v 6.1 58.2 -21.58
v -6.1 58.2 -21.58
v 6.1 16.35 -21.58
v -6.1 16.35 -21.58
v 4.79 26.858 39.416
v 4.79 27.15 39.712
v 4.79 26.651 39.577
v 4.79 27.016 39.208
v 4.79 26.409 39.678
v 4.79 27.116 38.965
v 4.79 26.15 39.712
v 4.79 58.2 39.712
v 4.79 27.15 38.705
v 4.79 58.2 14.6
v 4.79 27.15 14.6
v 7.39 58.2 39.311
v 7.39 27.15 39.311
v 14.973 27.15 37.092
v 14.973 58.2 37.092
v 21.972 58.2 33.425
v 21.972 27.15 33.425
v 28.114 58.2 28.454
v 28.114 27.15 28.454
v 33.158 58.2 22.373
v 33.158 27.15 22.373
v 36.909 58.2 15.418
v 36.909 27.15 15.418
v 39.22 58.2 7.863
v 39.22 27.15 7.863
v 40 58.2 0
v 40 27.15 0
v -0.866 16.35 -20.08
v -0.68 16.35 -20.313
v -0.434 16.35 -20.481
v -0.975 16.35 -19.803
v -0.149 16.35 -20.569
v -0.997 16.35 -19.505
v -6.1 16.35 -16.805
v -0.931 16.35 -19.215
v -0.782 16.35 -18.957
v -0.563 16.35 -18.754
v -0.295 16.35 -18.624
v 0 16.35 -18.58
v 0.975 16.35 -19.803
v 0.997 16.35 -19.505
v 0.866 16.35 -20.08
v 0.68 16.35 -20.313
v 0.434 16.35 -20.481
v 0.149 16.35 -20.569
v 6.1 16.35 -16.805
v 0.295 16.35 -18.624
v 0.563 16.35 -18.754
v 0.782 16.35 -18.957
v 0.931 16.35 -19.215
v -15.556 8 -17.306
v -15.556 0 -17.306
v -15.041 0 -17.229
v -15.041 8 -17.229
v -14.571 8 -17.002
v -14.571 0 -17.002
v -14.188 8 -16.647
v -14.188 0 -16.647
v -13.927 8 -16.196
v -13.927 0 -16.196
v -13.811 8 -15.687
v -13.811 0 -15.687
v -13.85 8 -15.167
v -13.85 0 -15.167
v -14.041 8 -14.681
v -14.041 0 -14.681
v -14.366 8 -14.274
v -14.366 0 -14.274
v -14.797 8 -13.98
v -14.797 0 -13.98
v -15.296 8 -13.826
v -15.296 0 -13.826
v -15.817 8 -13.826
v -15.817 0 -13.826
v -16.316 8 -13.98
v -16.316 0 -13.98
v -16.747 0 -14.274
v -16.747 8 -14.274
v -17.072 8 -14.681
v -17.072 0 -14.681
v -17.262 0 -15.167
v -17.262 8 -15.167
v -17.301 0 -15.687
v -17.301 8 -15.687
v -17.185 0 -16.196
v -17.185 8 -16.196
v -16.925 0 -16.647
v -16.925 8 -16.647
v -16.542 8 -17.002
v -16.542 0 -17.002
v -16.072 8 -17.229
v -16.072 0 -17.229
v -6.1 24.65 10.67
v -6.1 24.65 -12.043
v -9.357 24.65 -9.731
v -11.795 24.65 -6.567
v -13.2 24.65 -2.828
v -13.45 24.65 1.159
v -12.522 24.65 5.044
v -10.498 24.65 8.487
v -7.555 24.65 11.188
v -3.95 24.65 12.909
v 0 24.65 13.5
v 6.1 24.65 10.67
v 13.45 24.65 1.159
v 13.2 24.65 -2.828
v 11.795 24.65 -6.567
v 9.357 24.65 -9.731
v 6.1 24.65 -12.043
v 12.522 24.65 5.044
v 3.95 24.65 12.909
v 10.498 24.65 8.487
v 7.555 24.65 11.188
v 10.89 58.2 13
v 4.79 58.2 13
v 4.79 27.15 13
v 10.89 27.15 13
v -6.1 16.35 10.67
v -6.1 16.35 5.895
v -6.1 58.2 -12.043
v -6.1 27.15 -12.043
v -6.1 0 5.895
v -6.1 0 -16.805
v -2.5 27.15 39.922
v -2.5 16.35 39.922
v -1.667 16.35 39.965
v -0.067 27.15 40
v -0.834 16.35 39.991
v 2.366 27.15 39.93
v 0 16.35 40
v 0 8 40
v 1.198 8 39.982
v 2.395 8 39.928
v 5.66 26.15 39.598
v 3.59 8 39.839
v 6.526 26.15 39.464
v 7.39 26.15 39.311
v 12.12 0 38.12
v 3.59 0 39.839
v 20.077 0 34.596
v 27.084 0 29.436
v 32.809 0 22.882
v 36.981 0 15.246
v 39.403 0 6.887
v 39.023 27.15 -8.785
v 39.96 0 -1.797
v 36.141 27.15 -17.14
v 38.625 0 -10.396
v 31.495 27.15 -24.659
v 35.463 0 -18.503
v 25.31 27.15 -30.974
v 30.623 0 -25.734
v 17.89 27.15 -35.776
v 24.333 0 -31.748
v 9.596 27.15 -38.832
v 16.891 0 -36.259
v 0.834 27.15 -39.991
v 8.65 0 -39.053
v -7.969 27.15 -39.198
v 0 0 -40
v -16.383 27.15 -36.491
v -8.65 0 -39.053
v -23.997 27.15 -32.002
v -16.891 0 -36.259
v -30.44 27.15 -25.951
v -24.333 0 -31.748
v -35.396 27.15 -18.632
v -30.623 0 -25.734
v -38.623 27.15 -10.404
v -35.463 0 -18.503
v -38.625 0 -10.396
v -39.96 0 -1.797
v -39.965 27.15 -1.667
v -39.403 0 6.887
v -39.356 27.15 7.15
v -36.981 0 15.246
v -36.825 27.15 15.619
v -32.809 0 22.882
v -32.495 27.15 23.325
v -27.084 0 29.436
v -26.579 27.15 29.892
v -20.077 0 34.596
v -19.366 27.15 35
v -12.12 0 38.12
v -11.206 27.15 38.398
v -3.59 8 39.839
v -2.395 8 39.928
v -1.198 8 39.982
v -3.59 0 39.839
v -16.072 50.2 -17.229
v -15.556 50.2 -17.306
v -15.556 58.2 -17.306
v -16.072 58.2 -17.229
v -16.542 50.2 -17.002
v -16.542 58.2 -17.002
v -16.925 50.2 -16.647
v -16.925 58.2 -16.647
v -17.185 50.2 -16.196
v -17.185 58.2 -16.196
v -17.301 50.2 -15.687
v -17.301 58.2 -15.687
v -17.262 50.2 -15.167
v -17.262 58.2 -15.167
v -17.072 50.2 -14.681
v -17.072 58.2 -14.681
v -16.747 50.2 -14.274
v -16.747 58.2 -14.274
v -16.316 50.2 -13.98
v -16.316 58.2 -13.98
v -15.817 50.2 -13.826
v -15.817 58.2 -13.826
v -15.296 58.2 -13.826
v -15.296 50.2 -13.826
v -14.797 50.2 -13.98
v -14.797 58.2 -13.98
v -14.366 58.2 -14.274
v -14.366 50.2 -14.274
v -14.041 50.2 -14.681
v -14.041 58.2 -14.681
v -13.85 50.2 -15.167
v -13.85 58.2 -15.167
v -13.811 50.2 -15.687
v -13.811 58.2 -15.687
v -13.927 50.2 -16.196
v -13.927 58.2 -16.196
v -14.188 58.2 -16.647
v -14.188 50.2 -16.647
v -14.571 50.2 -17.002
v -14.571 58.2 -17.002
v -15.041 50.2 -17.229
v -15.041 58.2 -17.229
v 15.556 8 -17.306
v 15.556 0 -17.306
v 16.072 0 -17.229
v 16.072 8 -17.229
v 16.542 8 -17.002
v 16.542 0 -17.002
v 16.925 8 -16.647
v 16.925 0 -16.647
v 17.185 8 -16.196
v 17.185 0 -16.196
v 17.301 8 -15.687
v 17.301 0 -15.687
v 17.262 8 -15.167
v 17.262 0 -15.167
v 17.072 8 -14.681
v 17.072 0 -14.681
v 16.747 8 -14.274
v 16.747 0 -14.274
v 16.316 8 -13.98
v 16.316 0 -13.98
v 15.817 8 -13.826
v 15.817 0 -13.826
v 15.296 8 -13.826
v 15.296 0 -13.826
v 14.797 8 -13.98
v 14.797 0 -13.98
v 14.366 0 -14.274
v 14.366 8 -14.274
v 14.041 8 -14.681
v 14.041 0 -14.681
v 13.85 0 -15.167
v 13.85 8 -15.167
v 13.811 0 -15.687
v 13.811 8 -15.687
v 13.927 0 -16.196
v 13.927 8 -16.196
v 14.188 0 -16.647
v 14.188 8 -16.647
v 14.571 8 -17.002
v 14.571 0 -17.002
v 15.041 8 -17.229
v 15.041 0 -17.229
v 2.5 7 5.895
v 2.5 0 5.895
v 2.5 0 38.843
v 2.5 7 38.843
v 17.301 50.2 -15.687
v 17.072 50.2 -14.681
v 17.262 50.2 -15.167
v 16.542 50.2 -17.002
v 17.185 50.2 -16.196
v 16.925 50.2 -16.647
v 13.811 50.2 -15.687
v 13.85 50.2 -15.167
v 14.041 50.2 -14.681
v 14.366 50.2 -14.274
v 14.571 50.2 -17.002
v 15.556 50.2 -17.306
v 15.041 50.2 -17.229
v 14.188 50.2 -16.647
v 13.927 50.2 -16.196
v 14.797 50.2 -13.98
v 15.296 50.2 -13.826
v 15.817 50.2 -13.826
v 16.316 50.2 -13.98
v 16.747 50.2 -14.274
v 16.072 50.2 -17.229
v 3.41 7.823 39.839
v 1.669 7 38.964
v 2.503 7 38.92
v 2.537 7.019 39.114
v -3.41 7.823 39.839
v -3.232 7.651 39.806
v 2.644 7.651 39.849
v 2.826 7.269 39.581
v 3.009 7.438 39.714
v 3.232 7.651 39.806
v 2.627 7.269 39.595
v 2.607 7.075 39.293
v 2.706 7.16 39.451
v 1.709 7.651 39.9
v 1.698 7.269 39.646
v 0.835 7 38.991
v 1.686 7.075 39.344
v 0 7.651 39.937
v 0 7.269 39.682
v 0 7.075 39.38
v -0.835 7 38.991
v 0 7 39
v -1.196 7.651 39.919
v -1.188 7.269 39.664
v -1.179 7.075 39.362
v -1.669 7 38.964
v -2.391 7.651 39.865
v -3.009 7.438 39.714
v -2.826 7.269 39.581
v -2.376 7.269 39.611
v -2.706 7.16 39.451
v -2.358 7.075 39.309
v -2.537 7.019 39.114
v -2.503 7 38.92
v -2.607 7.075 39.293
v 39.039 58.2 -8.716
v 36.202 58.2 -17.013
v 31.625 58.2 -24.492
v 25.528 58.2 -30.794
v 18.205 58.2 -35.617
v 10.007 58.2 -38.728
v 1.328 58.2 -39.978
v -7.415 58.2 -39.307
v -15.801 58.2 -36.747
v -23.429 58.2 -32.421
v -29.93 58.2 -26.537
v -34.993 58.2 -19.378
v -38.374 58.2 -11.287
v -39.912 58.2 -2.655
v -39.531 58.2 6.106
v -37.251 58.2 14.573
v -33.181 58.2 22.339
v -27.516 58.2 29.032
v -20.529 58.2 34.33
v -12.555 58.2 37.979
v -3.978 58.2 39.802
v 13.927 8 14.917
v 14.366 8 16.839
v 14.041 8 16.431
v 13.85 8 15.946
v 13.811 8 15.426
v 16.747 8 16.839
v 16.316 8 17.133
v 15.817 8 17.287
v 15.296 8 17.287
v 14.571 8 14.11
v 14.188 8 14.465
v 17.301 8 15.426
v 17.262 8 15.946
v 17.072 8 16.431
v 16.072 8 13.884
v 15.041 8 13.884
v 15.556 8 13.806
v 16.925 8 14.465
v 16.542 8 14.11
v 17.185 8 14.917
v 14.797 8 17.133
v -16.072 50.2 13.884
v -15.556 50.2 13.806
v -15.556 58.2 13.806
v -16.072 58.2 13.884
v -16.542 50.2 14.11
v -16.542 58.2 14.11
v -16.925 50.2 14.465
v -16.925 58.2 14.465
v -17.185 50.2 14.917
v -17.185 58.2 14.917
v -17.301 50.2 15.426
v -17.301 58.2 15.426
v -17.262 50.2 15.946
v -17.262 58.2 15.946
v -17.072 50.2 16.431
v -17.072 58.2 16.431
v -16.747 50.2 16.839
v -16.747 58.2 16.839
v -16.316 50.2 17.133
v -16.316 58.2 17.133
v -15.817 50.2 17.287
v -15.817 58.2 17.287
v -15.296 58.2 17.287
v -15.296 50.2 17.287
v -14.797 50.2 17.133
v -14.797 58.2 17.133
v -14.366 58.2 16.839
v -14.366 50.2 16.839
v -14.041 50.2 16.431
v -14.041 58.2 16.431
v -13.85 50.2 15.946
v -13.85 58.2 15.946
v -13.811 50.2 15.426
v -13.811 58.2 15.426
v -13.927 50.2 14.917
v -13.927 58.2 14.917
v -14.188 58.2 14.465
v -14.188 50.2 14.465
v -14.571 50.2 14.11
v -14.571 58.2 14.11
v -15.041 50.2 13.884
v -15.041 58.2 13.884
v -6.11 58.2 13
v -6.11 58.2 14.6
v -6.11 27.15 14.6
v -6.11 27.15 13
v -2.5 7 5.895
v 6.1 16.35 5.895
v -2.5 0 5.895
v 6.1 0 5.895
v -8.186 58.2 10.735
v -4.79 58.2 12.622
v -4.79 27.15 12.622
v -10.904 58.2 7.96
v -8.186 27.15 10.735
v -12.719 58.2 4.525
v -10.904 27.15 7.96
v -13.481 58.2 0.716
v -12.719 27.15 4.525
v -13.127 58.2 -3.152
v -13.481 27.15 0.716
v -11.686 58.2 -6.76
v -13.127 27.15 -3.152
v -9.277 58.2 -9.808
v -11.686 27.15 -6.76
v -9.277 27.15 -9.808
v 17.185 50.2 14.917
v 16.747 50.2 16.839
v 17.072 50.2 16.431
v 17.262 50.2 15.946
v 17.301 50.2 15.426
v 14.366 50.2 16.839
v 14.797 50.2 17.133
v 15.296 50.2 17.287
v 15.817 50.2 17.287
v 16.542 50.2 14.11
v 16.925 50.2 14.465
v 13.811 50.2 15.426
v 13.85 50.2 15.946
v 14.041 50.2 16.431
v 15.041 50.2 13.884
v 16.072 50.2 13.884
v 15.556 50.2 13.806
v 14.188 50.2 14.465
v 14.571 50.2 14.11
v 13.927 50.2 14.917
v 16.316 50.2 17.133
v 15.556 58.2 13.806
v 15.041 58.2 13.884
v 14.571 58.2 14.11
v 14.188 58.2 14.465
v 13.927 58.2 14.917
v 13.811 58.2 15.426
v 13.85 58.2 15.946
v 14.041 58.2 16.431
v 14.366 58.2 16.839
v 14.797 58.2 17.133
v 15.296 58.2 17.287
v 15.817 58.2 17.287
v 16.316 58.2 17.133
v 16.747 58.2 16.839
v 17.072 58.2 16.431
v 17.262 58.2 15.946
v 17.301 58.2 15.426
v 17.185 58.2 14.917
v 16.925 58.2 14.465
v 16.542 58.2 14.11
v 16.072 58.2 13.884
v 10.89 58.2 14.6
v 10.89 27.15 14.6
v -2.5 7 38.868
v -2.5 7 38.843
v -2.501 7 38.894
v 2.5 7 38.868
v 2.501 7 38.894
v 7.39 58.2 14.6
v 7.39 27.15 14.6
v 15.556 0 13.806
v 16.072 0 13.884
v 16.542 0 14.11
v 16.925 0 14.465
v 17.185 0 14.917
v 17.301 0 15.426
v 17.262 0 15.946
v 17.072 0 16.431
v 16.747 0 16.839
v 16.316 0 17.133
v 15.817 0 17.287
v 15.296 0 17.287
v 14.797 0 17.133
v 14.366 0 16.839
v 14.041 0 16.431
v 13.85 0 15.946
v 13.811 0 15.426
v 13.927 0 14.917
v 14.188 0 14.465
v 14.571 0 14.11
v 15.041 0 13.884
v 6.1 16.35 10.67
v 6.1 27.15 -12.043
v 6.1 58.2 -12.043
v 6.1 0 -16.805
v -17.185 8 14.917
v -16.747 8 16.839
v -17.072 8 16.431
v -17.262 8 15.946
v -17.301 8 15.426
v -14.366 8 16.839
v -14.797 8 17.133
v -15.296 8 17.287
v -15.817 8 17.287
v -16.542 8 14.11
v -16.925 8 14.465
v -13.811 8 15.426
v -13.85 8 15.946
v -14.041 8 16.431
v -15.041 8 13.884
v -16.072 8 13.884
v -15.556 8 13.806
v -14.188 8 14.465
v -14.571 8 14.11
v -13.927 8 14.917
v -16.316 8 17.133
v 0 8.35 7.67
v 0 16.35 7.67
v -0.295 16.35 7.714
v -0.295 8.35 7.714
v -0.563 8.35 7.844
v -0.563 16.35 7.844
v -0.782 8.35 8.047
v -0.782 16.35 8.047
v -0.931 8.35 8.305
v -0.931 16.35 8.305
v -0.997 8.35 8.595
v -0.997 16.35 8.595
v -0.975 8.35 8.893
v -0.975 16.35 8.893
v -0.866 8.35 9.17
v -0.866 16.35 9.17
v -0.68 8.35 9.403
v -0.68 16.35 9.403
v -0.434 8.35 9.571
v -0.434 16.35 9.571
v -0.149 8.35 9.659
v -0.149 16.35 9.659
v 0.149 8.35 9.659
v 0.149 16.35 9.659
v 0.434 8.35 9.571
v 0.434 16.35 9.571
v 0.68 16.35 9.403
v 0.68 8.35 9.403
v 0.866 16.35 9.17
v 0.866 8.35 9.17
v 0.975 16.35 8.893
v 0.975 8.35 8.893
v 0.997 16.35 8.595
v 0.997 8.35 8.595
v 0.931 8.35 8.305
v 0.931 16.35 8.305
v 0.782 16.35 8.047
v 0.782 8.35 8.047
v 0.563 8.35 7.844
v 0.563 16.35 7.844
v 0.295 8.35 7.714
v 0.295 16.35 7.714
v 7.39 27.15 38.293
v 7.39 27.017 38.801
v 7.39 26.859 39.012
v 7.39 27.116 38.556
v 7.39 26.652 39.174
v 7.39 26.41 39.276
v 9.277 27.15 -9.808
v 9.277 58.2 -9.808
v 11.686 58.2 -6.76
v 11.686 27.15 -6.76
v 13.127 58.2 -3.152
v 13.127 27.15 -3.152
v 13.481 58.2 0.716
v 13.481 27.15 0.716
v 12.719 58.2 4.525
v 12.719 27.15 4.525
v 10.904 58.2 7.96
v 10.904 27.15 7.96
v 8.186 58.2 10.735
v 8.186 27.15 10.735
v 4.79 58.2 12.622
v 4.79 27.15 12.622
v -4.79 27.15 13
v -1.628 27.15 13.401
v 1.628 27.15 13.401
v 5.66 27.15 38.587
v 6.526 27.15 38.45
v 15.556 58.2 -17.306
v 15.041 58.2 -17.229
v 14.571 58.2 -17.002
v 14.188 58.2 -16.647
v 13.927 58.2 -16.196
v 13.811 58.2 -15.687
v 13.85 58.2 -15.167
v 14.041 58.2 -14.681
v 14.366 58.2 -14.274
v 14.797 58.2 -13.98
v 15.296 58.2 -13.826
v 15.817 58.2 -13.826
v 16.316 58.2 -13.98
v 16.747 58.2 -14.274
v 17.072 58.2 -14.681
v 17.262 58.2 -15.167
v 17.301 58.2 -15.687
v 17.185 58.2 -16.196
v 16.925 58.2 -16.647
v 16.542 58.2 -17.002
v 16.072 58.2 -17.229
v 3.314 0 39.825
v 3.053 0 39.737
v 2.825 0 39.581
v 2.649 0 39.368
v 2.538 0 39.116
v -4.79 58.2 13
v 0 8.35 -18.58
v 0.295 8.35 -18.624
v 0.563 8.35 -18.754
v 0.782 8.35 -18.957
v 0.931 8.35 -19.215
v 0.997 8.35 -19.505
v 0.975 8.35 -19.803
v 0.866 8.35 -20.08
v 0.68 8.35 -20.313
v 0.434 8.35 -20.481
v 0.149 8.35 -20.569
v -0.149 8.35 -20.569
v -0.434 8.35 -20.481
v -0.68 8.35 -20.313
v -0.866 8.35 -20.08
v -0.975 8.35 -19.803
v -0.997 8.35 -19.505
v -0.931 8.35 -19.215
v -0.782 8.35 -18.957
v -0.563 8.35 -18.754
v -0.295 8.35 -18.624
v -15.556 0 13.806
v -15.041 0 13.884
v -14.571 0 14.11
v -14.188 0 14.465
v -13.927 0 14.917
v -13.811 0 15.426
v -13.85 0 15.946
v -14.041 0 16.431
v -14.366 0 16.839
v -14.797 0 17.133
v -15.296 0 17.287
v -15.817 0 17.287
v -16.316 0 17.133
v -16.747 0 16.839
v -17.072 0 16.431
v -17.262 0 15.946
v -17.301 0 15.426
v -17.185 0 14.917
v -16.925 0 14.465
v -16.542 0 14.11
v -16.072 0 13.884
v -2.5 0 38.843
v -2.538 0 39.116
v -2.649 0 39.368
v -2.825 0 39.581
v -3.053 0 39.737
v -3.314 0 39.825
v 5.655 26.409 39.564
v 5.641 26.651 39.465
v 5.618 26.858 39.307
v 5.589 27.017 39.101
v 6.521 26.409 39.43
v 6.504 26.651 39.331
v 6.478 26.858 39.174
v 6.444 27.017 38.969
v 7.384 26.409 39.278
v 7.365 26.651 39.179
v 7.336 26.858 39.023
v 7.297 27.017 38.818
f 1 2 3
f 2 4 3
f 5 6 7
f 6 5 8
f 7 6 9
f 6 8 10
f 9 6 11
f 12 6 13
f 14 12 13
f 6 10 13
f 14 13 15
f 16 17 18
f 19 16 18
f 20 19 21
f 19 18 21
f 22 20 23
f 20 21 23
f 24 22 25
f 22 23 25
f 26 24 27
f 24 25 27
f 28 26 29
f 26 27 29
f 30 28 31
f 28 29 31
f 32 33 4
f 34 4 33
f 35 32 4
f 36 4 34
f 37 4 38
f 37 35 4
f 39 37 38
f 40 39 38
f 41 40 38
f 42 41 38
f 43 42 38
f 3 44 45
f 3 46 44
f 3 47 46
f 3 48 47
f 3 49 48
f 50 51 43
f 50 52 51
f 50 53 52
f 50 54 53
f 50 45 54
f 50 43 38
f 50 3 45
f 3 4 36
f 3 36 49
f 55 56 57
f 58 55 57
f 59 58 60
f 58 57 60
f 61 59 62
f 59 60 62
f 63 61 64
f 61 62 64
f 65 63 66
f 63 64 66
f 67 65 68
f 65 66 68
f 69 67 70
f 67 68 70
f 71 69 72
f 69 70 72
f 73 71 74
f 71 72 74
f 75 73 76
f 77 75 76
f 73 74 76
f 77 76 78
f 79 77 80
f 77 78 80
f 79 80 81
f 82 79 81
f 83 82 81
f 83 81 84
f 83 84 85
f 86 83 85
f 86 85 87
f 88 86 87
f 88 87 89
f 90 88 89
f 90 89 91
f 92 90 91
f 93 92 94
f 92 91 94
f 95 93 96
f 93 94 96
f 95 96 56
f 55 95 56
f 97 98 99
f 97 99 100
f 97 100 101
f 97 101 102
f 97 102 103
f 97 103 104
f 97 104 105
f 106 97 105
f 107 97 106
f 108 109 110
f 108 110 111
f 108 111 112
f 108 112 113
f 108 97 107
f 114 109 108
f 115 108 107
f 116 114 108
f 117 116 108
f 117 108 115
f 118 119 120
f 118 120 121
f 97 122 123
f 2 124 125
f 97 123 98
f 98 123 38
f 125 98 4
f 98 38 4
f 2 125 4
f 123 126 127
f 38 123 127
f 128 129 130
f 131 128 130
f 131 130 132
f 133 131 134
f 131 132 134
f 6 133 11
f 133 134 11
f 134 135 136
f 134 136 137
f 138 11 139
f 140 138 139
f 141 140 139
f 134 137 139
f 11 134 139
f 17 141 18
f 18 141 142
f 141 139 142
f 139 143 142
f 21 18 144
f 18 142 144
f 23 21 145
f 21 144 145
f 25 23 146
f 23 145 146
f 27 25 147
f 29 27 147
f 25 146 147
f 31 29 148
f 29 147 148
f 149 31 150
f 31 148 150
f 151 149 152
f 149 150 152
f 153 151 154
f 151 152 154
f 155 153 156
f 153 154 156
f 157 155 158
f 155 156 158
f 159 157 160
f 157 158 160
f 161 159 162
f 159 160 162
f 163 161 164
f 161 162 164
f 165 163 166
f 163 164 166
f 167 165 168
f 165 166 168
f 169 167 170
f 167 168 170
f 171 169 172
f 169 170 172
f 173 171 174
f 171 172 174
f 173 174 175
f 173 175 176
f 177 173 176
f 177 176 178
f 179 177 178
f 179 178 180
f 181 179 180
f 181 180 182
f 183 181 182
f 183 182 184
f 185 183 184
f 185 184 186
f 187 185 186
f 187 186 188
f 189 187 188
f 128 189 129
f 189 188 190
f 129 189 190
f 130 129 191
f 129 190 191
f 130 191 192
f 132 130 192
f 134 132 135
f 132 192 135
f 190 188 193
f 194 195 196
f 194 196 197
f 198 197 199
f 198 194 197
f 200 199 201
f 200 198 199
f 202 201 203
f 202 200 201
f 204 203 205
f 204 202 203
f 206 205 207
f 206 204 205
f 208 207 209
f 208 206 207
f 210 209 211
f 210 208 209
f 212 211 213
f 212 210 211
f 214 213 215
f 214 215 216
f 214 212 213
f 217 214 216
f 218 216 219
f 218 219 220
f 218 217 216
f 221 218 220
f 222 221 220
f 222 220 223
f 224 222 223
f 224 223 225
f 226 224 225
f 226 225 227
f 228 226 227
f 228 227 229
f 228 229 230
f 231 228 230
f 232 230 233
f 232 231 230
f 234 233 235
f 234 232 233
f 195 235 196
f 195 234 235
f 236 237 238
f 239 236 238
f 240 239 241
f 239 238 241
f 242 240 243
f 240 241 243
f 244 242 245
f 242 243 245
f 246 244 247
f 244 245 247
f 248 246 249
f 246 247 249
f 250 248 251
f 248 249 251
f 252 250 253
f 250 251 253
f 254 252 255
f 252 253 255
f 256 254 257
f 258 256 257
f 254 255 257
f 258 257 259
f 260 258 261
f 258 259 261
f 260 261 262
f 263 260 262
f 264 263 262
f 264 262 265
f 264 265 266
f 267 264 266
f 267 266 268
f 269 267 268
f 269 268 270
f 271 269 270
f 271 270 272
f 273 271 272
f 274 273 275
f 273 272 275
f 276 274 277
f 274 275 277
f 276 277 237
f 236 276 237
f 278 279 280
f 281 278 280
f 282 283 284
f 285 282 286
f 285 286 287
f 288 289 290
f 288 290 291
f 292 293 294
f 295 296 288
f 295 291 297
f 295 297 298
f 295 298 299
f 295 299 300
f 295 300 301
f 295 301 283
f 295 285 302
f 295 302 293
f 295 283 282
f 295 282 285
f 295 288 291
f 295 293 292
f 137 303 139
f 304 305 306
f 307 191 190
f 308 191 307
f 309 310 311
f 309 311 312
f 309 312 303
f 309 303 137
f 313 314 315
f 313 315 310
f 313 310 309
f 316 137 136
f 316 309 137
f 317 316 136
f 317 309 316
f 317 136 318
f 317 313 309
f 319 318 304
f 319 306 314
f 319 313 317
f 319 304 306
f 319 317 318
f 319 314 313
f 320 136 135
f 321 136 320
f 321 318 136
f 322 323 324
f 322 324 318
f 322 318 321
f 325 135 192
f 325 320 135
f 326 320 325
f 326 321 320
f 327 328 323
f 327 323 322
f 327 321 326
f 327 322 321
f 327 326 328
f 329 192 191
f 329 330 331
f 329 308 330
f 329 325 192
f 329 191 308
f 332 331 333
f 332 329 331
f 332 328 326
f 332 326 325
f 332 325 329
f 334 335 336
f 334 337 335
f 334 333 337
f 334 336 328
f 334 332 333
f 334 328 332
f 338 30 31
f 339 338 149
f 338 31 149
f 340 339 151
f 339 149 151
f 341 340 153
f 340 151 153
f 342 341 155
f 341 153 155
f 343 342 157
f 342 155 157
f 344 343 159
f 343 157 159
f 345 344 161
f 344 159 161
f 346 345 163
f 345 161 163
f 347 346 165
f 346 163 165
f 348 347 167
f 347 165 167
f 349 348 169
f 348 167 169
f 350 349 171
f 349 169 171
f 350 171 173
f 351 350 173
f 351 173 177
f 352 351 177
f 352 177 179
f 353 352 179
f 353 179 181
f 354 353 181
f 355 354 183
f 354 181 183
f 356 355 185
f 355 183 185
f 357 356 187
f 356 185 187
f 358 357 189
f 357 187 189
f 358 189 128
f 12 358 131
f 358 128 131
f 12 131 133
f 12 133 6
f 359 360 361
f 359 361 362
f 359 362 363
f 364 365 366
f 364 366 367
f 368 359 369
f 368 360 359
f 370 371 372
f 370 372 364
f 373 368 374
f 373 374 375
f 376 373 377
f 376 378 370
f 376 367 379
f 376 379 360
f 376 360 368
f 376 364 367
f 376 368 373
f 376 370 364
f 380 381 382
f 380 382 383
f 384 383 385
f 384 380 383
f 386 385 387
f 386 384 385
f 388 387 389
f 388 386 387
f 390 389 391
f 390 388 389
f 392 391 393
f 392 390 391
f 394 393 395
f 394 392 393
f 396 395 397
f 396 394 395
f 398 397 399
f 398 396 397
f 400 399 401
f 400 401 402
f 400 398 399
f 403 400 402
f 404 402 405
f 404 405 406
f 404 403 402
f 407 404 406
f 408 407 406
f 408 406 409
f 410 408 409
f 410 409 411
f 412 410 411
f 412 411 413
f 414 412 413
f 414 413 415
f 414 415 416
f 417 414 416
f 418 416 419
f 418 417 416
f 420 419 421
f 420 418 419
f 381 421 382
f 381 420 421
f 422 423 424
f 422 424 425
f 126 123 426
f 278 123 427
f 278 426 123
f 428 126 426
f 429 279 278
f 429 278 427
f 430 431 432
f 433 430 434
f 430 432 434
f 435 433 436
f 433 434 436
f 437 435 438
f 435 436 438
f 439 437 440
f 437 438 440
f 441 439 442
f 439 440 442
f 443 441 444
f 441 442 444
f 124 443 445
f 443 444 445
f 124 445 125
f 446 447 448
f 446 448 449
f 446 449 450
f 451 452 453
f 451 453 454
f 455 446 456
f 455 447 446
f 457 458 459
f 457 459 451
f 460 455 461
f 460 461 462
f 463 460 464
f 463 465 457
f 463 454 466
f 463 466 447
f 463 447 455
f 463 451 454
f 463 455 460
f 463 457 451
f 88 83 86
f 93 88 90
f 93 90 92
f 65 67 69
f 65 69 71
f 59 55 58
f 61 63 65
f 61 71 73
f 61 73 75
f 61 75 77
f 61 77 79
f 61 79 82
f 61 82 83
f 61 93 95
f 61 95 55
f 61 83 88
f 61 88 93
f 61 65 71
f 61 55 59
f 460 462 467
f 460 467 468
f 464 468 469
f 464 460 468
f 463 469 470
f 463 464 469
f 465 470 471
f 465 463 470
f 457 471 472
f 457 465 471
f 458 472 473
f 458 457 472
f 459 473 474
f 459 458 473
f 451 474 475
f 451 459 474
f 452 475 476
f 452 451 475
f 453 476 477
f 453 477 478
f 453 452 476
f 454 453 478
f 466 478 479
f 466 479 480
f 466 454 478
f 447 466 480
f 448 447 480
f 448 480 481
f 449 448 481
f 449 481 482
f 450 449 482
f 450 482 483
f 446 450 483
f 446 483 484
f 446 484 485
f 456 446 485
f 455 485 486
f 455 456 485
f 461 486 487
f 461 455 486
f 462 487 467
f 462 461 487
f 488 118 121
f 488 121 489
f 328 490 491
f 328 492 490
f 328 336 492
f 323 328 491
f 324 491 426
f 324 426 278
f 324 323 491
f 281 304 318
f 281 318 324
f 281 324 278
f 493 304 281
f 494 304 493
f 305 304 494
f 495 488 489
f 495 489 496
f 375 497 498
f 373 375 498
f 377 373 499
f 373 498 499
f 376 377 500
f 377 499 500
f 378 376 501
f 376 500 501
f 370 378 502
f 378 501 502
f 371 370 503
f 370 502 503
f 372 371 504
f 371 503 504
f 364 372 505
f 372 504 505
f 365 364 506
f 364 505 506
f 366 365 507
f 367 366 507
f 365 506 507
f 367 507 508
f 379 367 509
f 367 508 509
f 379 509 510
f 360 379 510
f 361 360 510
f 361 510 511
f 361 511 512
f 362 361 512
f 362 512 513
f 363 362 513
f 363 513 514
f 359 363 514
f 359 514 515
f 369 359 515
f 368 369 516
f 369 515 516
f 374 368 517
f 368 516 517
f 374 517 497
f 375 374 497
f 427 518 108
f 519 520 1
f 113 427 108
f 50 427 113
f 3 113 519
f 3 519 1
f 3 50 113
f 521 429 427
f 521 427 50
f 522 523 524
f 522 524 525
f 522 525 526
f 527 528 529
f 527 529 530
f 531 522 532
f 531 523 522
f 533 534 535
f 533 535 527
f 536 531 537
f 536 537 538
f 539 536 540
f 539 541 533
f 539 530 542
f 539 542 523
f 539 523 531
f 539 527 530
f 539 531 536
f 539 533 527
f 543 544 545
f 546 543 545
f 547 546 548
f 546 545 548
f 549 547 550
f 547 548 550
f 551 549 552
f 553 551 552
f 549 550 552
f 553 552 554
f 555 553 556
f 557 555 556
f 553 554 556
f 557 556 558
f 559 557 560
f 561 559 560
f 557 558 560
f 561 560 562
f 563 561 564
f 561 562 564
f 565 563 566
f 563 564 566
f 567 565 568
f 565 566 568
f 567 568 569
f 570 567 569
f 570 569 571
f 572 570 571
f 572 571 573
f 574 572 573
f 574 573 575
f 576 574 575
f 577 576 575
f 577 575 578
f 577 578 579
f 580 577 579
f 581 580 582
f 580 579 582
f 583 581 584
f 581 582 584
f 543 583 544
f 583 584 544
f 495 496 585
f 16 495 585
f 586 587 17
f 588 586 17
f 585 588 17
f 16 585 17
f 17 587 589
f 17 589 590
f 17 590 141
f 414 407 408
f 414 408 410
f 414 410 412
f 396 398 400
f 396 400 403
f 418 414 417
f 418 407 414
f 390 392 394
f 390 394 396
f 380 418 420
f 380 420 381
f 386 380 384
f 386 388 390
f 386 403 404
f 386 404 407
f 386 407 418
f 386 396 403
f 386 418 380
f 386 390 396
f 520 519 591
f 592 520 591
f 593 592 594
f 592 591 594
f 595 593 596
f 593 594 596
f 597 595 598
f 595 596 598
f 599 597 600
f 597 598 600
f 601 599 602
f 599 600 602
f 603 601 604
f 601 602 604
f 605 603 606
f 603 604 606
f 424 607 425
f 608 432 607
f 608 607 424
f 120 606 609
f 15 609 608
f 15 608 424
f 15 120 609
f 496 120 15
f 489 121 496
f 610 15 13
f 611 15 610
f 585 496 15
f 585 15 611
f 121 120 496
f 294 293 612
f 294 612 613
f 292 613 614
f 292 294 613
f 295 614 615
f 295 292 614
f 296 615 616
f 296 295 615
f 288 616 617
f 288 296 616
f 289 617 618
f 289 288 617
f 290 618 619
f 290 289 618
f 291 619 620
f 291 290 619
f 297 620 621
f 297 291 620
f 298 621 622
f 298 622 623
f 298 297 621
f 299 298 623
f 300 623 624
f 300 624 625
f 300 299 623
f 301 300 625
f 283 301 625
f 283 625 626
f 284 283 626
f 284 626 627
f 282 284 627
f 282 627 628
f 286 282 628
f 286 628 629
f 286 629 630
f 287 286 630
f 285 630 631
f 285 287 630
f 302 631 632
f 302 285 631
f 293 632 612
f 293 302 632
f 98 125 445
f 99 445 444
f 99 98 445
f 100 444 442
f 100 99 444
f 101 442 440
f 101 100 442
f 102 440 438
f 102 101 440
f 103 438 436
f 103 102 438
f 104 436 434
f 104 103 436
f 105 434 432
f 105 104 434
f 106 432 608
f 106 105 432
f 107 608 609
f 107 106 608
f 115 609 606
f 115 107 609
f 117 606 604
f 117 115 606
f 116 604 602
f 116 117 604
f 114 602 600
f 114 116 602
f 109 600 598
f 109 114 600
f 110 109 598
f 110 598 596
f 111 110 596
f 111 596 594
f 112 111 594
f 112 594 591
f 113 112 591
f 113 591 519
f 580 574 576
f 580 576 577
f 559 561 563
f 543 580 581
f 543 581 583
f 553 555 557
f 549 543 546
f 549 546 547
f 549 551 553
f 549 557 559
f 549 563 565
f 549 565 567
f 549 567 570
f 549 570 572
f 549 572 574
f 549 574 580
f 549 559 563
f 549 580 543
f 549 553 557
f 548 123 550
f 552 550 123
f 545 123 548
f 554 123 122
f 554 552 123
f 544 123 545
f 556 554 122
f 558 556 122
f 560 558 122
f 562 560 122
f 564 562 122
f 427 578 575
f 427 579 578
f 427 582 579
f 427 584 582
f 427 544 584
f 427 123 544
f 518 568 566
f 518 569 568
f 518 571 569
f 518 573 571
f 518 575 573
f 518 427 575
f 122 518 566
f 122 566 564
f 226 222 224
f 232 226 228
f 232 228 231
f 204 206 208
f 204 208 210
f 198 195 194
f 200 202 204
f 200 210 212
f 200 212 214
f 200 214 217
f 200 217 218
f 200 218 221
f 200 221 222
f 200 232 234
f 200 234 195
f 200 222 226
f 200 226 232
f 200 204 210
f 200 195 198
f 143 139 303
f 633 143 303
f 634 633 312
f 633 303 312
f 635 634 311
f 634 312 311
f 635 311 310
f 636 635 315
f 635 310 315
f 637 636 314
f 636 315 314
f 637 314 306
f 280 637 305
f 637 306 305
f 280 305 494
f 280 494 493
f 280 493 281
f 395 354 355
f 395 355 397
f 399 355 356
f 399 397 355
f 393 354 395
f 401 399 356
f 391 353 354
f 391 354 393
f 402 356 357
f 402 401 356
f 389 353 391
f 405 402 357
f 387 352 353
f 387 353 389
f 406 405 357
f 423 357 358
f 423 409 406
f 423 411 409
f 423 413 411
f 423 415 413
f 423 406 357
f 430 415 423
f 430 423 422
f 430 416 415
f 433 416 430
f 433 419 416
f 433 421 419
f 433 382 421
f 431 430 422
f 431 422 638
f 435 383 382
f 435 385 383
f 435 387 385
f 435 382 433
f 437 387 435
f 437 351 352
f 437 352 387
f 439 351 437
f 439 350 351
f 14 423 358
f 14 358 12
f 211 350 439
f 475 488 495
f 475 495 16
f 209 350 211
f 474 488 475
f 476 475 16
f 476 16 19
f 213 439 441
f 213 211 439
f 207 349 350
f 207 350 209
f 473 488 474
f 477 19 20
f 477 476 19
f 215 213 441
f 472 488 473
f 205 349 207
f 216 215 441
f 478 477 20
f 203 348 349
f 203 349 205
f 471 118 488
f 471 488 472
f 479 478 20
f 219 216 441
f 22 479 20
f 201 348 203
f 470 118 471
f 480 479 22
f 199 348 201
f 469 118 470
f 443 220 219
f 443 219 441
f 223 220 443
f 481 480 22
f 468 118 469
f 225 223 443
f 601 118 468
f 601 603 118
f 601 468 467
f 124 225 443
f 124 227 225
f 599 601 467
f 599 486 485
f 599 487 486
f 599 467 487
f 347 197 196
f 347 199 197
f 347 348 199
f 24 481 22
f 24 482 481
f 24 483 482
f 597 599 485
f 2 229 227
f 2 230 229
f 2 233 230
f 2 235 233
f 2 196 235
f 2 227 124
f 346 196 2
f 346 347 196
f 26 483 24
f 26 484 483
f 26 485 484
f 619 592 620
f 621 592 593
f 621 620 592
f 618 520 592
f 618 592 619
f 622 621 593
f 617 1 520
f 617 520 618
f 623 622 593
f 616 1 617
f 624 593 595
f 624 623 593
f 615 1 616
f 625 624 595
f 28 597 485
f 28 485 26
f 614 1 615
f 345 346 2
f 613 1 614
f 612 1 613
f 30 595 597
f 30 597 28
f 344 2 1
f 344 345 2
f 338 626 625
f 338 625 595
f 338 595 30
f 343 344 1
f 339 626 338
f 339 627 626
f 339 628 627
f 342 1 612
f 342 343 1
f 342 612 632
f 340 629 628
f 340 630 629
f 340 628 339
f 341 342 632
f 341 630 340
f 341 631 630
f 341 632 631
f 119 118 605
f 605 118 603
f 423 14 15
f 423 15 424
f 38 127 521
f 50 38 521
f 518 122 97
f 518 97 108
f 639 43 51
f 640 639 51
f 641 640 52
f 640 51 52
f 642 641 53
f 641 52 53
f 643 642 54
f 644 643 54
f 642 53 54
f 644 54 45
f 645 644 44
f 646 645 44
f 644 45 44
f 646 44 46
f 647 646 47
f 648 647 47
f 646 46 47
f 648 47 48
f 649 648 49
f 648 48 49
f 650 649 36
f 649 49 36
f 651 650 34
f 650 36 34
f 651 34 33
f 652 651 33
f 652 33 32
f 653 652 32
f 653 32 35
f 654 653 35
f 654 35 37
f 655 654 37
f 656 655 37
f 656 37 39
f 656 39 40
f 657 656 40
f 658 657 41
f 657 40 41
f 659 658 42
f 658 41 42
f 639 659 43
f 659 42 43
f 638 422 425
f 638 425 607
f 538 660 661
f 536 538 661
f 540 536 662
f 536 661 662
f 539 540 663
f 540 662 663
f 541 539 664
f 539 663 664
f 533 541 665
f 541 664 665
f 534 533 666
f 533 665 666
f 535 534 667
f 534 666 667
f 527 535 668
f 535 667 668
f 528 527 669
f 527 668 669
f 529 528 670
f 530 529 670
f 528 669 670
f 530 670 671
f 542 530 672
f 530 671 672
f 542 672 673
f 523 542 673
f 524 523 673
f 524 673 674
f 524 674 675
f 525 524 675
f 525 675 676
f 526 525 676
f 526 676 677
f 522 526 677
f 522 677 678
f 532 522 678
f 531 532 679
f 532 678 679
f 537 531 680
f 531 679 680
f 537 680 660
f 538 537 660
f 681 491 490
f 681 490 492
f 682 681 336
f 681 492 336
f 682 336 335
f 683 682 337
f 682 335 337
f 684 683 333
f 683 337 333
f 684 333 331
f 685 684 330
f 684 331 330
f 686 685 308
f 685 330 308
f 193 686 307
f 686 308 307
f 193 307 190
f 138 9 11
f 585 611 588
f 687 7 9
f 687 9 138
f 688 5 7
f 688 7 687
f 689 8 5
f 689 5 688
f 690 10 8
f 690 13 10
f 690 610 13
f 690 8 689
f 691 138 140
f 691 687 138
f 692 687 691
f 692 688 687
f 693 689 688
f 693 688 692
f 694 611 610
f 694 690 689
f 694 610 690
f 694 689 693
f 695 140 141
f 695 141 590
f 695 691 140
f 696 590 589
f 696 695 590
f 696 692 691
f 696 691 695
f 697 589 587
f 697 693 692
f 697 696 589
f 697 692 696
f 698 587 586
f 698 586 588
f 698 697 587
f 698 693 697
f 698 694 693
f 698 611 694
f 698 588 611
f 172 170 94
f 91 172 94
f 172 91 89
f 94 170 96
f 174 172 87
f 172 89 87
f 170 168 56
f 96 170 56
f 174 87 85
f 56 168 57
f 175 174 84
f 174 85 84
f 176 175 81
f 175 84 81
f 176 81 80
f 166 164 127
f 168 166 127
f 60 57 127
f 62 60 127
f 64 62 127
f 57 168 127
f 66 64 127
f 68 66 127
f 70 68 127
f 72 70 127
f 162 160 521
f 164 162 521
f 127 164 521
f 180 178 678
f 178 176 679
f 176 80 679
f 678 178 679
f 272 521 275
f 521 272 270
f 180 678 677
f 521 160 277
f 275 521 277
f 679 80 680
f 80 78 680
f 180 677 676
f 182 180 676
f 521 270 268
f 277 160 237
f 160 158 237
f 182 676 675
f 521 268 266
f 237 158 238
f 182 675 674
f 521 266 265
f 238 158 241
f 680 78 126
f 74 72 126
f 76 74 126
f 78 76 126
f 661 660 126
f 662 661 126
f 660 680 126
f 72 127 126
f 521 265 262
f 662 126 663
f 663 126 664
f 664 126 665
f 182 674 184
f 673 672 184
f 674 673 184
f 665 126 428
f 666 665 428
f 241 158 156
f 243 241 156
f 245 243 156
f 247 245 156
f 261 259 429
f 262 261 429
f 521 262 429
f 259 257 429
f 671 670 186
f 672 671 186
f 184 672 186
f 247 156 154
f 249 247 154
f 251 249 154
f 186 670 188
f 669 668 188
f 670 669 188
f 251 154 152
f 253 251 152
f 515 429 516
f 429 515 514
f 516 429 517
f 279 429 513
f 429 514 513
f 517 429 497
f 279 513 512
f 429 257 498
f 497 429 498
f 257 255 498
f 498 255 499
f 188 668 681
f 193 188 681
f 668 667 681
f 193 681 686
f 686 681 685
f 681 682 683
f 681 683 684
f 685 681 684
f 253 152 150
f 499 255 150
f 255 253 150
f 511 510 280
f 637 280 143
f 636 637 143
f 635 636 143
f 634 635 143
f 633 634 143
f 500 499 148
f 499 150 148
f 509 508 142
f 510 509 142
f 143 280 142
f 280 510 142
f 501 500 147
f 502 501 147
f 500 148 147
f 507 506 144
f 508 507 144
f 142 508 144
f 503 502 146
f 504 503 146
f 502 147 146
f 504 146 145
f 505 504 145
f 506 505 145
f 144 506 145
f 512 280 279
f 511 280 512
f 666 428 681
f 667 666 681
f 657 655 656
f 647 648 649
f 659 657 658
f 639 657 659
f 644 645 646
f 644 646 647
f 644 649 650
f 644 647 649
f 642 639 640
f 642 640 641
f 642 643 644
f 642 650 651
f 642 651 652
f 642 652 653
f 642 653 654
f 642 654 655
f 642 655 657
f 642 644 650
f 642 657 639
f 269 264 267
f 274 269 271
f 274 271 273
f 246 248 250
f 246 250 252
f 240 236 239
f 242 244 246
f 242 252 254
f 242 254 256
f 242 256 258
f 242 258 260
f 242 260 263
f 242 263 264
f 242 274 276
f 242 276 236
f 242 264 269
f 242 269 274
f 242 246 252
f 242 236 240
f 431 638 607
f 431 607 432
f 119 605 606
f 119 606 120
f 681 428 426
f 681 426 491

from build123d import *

# Parameters (mm, degrees)
SKETCH1_R           = 40
SKETCH1_W           = 12.2
SKETCH1_H           = 22.7
BOSS_EXTRUDE1_DEPTH = 16.35
SKETCH3_W           = 5
SKETCH3_H           = 34.105
CUT_EXTRUDE1_DEPTH  = 7
SKETCH4_R           = 1.75
CUT_EXTRUDE2_DEPTH  = 8
SKETCH2_R           = 40
SKETCH2_W           = 12.2
SKETCH2_H           = 32.25
BOSS_EXTRUDE2_DEPTH = 8.3
SKETCH5_R           = 1
CUT_EXTRUDE3_DEPTH  = 8
SKETCH6_R           = 40
BOSS_EXTRUDE3_DEPTH = 2.5
BOSS_EXTRUDE4_DEPTH = 31.05
CUT_EXTRUDE4_START  = -8
SKETCH8_R           = 1.75
CUT_EXTRUDE4_DEPTH  = 8
FILLET1_R           = 1


with BuildPart() as part:
    # Sketch1 → Boss-Extrude1 (new body)
    with BuildSketch(Plane(origin=(0, 0, 0), x_dir=(1, 0, 0), z_dir=(0, 1, 0))):
        with Locations(Location((0, 0, 0), (0, 0, 270))):
            Circle(SKETCH1_R)
        with Locations((0, 5.455)):
            Rectangle(SKETCH1_W, SKETCH1_H, mode=Mode.SUBTRACT)
    extrude(amount=BOSS_EXTRUDE1_DEPTH)

    # Sketch3 → Cut-Extrude1 (cut)
    with BuildSketch(Plane.XZ):
        with Locations((0, 22.9475)):
            Rectangle(SKETCH3_W, SKETCH3_H)
    extrude(amount=-CUT_EXTRUDE1_DEPTH, mode=Mode.SUBTRACT)

    # Sketch4 → Cut-Extrude2 (cut)
    with BuildSketch(Plane.XZ):
        with Locations(Location((-15.556349186, 15.556349186, 0), (0, 0, 270))):
            Circle(SKETCH4_R)
        with Locations(Location((15.556349186, 15.556349186, 0), (0, 0, 270))):
            Circle(SKETCH4_R)
        with Locations(Location((15.556349186, -15.556349186, 0), (0, 0, 270))):
            Circle(SKETCH4_R)
        with Locations(Location((-15.556349186, -15.556349186, 0), (0, 0, 270))):
            Circle(SKETCH4_R)
    extrude(amount=-CUT_EXTRUDE2_DEPTH, mode=Mode.SUBTRACT)

    # Sketch2 → Boss-Extrude2 (add)
    with BuildSketch(Plane(origin=(0, 16.35, 0), x_dir=(1, 0, 0), z_dir=(0, 1, 0))):
        with Locations(Location((0, 0, 0), (0, 0, 266.416678302))):
            Circle(SKETCH2_R)
        with Locations((0, 5.455)):
            Rectangle(SKETCH2_W, SKETCH2_H, mode=Mode.SUBTRACT)
    extrude(amount=BOSS_EXTRUDE2_DEPTH)

    # Sketch5 → Cut-Extrude3 (cut)
    with BuildSketch(Plane(origin=(0, 16.35, 0), x_dir=(1, 0, 0), z_dir=(0, 1, 0))):
        with Locations(Location((0, 19.58, 0), (0, 0, 270))):
            Circle(SKETCH5_R)
        with Locations(Location((0, -8.67, 0), (0, 0, 90))):
            Circle(SKETCH5_R)
    extrude(amount=-CUT_EXTRUDE3_DEPTH, mode=Mode.SUBTRACT)

    # Sketch6 → Boss-Extrude3 (add)
    with BuildSketch(Plane(origin=(0, 24.65, 0), x_dir=(1, 0, 0), z_dir=(0, 1, 0))):
        with Locations(Location((0, 0, 0), (0, 0, 266.416678302))):
            Circle(SKETCH6_R)
        with BuildLine():
            Line((6.1, 12.043255374), (6.1, 21.58))
            Line((6.1, 21.58), (-6.1, 21.58))
            Line((-6.1, 21.58), (-6.1, 12.043255374))
            ThreePointArc((-6.1, 12.043255374), (0, -13.5), (6.1, 12.043255374))
        make_face(mode=Mode.SUBTRACT)
    extrude(amount=BOSS_EXTRUDE3_DEPTH)

    # Sketch7 → Boss-Extrude4 (add)
    with BuildSketch(Plane(origin=(0, 27.15, 0), x_dir=(1, 0, 0), z_dir=(0, 1, 0))):
        with BuildLine():
            ThreePointArc((-4.790054945, -12.621623256), (-13.48100084, -0.715972321), (-6.1, 12.043255374))
            Line((-6.1, 12.043255374), (-6.1, 21.58))
            Line((-6.1, 21.58), (6.1, 21.58))
            Line((6.1, 21.58), (6.1, 12.043255374))
            ThreePointArc((6.1, 12.043255374), (13.480999281, -0.716001663), (4.79, -12.621644108))
            Line((4.79, -12.621644108), (4.79, -13))
            Line((4.79, -13), (10.89, -13))
            Line((10.89, -13), (10.89, -14.6))
            Line((10.89, -14.6), (7.39, -14.6))
            Line((7.39, -14.6), (7.39, -39.311422004))
            ThreePointArc((7.39, -39.311422004), (30.786360616, -25.538206672), (40, 0))
            ThreePointArc((40, 0), (-29.929918142, 26.536766947), (4.79, -39.712163124))
            Line((4.79, -39.712163124), (4.79, -14.6))
            Line((4.79, -14.6), (-6.11, -14.6))
            Line((-6.11, -14.6), (-6.11, -13))
            Line((-6.11, -13), (-4.790054945, -13))
            Line((-4.790054945, -13), (-4.790054945, -12.621623256))
        make_face()
    extrude(amount=BOSS_EXTRUDE4_DEPTH)

    # Sketch8 → Cut-Extrude4 (cut)
    with BuildSketch(Plane(origin=(0, 58.2, 0), x_dir=(1, 0, 0), z_dir=(0, 1, 0)).offset(CUT_EXTRUDE4_START)):
        with Locations(Location((-15.556349186, 15.556349186, 0), (0, 0, 90))):
            Circle(SKETCH8_R)
        with Locations(Location((15.556349186, 15.556349186, 0), (0, 0, 90))):
            Circle(SKETCH8_R)
        with Locations(Location((15.556349186, -15.556349186, 0), (0, 0, 90))):
            Circle(SKETCH8_R)
        with Locations(Location((-15.556349186, -15.556349186, 0), (0, 0, 90))):
            Circle(SKETCH8_R)
    extrude(amount=CUT_EXTRUDE4_DEPTH, mode=Mode.SUBTRACT)

    # Fillet1
    # the kernel refuses this fillet: 1 mm, written as the material it takes off along each edge
    with BuildSketch(Plane(origin=(-2.5, 7, 39.921798557), x_dir=(-0.9970979844940963, 0, -0.07612889936030137), z_dir=(0, -1, 0))) as fillet1_piece_1:
        with BuildLine():
            CenterArc((1.079253806, 0.999906678), FILLET1_R, 175.633911064, 95.148856173)
            Line((0.082155822, 1.076035578), (0, 0))
            ThreePointArc((0, 0), (0.546457623, -0.003732873), (1.092915247, 0))
        make_face()
    extrude(amount=9.732288117, mode=Mode.SUBTRACT)
    with BuildSketch(Plane(origin=(2.5, 7, 39.921798557), x_dir=(0.9970979844940963, 0, -0.07612889936030175), z_dir=(0, -1, 0))) as fillet1_piece_2:
        with BuildLine():
            CenterArc((1.079253806, -0.999906678), FILLET1_R, 89.217232763, 95.148856173)
            Line((0.082155822, -1.076035578), (0, 0))
            ThreePointArc((0, 0), (0.546457623, 0.003732873), (1.092915247, 0))
        make_face()
    extrude(amount=9.732288117, mode=Mode.SUBTRACT)
    with BuildSketch(Plane(origin=(0, 7, 0), x_dir=(0.12471521651868436, 0, 0.9921925794767352), z_dir=(0.9921925794767352, 0, -0.12471521651868436))) as fillet1_piece_3_section:
        with BuildLine():
            CenterArc((40 - FILLET1_R, -FILLET1_R), FILLET1_R, 0, 90)
            Line((40 - FILLET1_R, 0), (40, 0))
            Line((40, 0), (40, -FILLET1_R))
        make_face()
    fillet1_piece_3 = revolve(axis=Axis((0, 7, 0), (0, -1, 0)), revolution_arc=7.164310198, mode=Mode.PRIVATE)
    fillet1_piece_3 = split(fillet1_piece_3, bisect_by=Plane(origin=(2.5, 7.226394193, 39.747383267), z_dir=(-1, 0, 0)), keep=Keep.TOP, mode=Mode.PRIVATE)
    add(fillet1_piece_3, mode=Mode.SUBTRACT)
    with BuildSketch(Plane(origin=(0, 27.15, 0), x_dir=(0.057506279993827, 0, 0.9983451446074506), z_dir=(-0.9983451446074506, 0, 0.057506279993827))) as fillet1_piece_4_section:
        with BuildLine():
            CenterArc((40 - FILLET1_R, -FILLET1_R), FILLET1_R, 0, 90)
            Line((40 - FILLET1_R, 0), (40, 0))
            Line((40, 0), (40, -FILLET1_R))
        make_face()
    fillet1_piece_4 = revolve(axis=Axis((0, 27.15, 0), (0, 1, 0)), revolution_arc=10.930860095, mode=Mode.PRIVATE)
    fillet1_piece_4 = split(fillet1_piece_4, bisect_by=Plane(origin=(4.79, 26.923621973, 39.296870163), z_dir=(1, 0, 0)), keep=Keep.TOP, mode=Mode.PRIVATE)
    fillet1_piece_4 = split(fillet1_piece_4, bisect_by=Plane(origin=(7.39, 26.923621973, 39.296870163), z_dir=(-1, 0, 0)), keep=Keep.TOP, mode=Mode.PRIVATE)
    add(fillet1_piece_4, mode=Mode.SUBTRACT)
    with BuildSketch(Plane(origin=(0, 7, 0), x_dir=(0, 0, 1), z_dir=(1, 0, 0))) as fillet1_piece_5_section:
        with BuildLine():
            CenterArc((40 - FILLET1_R, -FILLET1_R), FILLET1_R, 0, 90)
            Line((40 - FILLET1_R, 0), (40, 0))
            Line((40, 0), (40, -FILLET1_R))
        make_face()
    fillet1_piece_5 = revolve(axis=Axis((0, 7, 0), (0, -1, 0)), revolution_arc=7.164310198, mode=Mode.PRIVATE)
    fillet1_piece_5 = split(fillet1_piece_5, bisect_by=Plane(origin=(-2.5, 7.226394086, 39.74738287), z_dir=(1, 0, 0)), keep=Keep.TOP, mode=Mode.PRIVATE)
    add(fillet1_piece_5, mode=Mode.SUBTRACT)
    with BuildSketch(Plane(origin=(0, 7, 0), x_dir=(0, 0, 1), z_dir=(1, 0, 0))) as fillet1_piece_6a_section:
        with BuildLine():
            CenterArc((40 - FILLET1_R, -FILLET1_R), FILLET1_R, 0, 90)
            Line((40 - FILLET1_R, 0), (40, 0))
            Line((40, 0), (40, -FILLET1_R))
        make_face()
    fillet1_piece_6a = revolve(axis=Axis((0, 7, 0), (0, -1, 0)), revolution_arc=7.164310198, mode=Mode.PRIVATE)
    fillet1_piece_6a = split(fillet1_piece_6a, bisect_by=Plane(origin=(-2.5, 7.227785013, 39.594106119), z_dir=(-1, 0, 0)), keep=Keep.TOP, mode=Mode.PRIVATE)
    with BuildSketch(Plane(origin=(-2.5, 9.732288117, 39.921798557), x_dir=(-0.9970979844940969, 0, -0.07612889936029517), z_dir=(0, -1, 0))) as fillet1_piece_6b_section:
        with BuildLine():
            CenterArc((1.079253806, 0.999906678), FILLET1_R, 175.633911064, 95.148856173)
            Line((0.082155822, 1.076035578), (0, 0))
            ThreePointArc((0, 0), (0.546457623, -0.003732873), (1.092915247, 0))
        make_face()
    fillet1_piece_6b = extrude(amount=12.464576234, mode=Mode.PRIVATE)
    fillet1_piece_6b = split(fillet1_piece_6b, bisect_by=Plane(origin=(-2.749431224, 7, 39.658633208), z_dir=(0, 1, 0)), keep=Keep.TOP, mode=Mode.PRIVATE)
    fillet1_piece_6 = fillet1_piece_6a & fillet1_piece_6b
    add(fillet1_piece_6, mode=Mode.SUBTRACT)
    with BuildSketch(Plane(origin=(2.5, 9.732288117, 39.921798557), x_dir=(0.9970979844940969, 0, -0.07612889936029532), z_dir=(0, -1, 0))) as fillet1_piece_7a_section:
        with BuildLine():
            CenterArc((1.079253806, -0.999906678), FILLET1_R, 89.217232763, 95.148856173)
            Line((0.082155822, -1.076035578), (0, 0))
            ThreePointArc((0, 0), (0.546457623, 0.003732873), (1.092915247, 0))
        make_face()
    fillet1_piece_7a = extrude(amount=12.464576234, mode=Mode.PRIVATE)
    fillet1_piece_7a = split(fillet1_piece_7a, bisect_by=Plane(origin=(2.749431224, 7, 39.658633208), z_dir=(0, 1, 0)), keep=Keep.TOP, mode=Mode.PRIVATE)
    with BuildSketch(Plane(origin=(0, 7, 0), x_dir=(0.12471521651868436, 0, 0.9921925794767352), z_dir=(0.9921925794767352, 0, -0.12471521651868436))) as fillet1_piece_7b_section:
        with BuildLine():
            CenterArc((40 - FILLET1_R, -FILLET1_R), FILLET1_R, 0, 90)
            Line((40 - FILLET1_R, 0), (40, 0))
            Line((40, 0), (40, -FILLET1_R))
        make_face()
    fillet1_piece_7b = revolve(axis=Axis((0, 7, 0), (0, -1, 0)), revolution_arc=7.164310198, mode=Mode.PRIVATE)
    fillet1_piece_7b = split(fillet1_piece_7b, bisect_by=Plane(origin=(2.5, 7.227784999, 39.594105903), z_dir=(1, 0, 0)), keep=Keep.TOP, mode=Mode.PRIVATE)
    fillet1_piece_7 = fillet1_piece_7a & fillet1_piece_7b
    add(fillet1_piece_7, mode=Mode.SUBTRACT)


solid = part.part
